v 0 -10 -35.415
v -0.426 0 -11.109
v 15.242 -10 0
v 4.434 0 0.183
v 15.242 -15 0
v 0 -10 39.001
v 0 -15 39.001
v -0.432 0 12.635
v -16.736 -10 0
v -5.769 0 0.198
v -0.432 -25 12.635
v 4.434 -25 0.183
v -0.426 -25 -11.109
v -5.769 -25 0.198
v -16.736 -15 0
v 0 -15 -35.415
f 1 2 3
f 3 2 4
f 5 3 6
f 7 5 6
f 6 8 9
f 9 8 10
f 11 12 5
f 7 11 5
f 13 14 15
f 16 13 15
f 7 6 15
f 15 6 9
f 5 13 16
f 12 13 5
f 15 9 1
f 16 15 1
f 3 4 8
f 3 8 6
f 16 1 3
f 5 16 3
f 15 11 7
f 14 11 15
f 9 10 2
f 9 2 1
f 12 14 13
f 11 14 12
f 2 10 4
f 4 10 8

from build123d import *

# Parameters (mm, degrees)
F1_DEPTH = 25
F2_SIZE  = 10


with BuildPart() as f1:
    # F0 (on Front) → F1 (new body)
    with BuildSketch(Plane.XZ):
        Polygon((0, 39.001424), (-16.736243, 0), (0, -35.415087), (15.241938, 0), align=None)
    extrude(amount=F1_DEPTH)

    # F2
    f2_edges = [f1.edges().sort_by_distance(p)[0] for p in [
        (-8.368121, -25, 19.500712),
        (-8.368121, 0, 19.500712),
        (-8.368121, -25, -17.707543),
        (-8.368121, 0, -17.707543),
        (7.620969, 0, 19.500712),
        (7.620969, -25, 19.500712),
        (7.620969, -25, -17.707543),
        (7.620969, 0, -17.707543),
    ]]
    chamfer(f2_edges, length=F2_SIZE)


solid = f1.part
